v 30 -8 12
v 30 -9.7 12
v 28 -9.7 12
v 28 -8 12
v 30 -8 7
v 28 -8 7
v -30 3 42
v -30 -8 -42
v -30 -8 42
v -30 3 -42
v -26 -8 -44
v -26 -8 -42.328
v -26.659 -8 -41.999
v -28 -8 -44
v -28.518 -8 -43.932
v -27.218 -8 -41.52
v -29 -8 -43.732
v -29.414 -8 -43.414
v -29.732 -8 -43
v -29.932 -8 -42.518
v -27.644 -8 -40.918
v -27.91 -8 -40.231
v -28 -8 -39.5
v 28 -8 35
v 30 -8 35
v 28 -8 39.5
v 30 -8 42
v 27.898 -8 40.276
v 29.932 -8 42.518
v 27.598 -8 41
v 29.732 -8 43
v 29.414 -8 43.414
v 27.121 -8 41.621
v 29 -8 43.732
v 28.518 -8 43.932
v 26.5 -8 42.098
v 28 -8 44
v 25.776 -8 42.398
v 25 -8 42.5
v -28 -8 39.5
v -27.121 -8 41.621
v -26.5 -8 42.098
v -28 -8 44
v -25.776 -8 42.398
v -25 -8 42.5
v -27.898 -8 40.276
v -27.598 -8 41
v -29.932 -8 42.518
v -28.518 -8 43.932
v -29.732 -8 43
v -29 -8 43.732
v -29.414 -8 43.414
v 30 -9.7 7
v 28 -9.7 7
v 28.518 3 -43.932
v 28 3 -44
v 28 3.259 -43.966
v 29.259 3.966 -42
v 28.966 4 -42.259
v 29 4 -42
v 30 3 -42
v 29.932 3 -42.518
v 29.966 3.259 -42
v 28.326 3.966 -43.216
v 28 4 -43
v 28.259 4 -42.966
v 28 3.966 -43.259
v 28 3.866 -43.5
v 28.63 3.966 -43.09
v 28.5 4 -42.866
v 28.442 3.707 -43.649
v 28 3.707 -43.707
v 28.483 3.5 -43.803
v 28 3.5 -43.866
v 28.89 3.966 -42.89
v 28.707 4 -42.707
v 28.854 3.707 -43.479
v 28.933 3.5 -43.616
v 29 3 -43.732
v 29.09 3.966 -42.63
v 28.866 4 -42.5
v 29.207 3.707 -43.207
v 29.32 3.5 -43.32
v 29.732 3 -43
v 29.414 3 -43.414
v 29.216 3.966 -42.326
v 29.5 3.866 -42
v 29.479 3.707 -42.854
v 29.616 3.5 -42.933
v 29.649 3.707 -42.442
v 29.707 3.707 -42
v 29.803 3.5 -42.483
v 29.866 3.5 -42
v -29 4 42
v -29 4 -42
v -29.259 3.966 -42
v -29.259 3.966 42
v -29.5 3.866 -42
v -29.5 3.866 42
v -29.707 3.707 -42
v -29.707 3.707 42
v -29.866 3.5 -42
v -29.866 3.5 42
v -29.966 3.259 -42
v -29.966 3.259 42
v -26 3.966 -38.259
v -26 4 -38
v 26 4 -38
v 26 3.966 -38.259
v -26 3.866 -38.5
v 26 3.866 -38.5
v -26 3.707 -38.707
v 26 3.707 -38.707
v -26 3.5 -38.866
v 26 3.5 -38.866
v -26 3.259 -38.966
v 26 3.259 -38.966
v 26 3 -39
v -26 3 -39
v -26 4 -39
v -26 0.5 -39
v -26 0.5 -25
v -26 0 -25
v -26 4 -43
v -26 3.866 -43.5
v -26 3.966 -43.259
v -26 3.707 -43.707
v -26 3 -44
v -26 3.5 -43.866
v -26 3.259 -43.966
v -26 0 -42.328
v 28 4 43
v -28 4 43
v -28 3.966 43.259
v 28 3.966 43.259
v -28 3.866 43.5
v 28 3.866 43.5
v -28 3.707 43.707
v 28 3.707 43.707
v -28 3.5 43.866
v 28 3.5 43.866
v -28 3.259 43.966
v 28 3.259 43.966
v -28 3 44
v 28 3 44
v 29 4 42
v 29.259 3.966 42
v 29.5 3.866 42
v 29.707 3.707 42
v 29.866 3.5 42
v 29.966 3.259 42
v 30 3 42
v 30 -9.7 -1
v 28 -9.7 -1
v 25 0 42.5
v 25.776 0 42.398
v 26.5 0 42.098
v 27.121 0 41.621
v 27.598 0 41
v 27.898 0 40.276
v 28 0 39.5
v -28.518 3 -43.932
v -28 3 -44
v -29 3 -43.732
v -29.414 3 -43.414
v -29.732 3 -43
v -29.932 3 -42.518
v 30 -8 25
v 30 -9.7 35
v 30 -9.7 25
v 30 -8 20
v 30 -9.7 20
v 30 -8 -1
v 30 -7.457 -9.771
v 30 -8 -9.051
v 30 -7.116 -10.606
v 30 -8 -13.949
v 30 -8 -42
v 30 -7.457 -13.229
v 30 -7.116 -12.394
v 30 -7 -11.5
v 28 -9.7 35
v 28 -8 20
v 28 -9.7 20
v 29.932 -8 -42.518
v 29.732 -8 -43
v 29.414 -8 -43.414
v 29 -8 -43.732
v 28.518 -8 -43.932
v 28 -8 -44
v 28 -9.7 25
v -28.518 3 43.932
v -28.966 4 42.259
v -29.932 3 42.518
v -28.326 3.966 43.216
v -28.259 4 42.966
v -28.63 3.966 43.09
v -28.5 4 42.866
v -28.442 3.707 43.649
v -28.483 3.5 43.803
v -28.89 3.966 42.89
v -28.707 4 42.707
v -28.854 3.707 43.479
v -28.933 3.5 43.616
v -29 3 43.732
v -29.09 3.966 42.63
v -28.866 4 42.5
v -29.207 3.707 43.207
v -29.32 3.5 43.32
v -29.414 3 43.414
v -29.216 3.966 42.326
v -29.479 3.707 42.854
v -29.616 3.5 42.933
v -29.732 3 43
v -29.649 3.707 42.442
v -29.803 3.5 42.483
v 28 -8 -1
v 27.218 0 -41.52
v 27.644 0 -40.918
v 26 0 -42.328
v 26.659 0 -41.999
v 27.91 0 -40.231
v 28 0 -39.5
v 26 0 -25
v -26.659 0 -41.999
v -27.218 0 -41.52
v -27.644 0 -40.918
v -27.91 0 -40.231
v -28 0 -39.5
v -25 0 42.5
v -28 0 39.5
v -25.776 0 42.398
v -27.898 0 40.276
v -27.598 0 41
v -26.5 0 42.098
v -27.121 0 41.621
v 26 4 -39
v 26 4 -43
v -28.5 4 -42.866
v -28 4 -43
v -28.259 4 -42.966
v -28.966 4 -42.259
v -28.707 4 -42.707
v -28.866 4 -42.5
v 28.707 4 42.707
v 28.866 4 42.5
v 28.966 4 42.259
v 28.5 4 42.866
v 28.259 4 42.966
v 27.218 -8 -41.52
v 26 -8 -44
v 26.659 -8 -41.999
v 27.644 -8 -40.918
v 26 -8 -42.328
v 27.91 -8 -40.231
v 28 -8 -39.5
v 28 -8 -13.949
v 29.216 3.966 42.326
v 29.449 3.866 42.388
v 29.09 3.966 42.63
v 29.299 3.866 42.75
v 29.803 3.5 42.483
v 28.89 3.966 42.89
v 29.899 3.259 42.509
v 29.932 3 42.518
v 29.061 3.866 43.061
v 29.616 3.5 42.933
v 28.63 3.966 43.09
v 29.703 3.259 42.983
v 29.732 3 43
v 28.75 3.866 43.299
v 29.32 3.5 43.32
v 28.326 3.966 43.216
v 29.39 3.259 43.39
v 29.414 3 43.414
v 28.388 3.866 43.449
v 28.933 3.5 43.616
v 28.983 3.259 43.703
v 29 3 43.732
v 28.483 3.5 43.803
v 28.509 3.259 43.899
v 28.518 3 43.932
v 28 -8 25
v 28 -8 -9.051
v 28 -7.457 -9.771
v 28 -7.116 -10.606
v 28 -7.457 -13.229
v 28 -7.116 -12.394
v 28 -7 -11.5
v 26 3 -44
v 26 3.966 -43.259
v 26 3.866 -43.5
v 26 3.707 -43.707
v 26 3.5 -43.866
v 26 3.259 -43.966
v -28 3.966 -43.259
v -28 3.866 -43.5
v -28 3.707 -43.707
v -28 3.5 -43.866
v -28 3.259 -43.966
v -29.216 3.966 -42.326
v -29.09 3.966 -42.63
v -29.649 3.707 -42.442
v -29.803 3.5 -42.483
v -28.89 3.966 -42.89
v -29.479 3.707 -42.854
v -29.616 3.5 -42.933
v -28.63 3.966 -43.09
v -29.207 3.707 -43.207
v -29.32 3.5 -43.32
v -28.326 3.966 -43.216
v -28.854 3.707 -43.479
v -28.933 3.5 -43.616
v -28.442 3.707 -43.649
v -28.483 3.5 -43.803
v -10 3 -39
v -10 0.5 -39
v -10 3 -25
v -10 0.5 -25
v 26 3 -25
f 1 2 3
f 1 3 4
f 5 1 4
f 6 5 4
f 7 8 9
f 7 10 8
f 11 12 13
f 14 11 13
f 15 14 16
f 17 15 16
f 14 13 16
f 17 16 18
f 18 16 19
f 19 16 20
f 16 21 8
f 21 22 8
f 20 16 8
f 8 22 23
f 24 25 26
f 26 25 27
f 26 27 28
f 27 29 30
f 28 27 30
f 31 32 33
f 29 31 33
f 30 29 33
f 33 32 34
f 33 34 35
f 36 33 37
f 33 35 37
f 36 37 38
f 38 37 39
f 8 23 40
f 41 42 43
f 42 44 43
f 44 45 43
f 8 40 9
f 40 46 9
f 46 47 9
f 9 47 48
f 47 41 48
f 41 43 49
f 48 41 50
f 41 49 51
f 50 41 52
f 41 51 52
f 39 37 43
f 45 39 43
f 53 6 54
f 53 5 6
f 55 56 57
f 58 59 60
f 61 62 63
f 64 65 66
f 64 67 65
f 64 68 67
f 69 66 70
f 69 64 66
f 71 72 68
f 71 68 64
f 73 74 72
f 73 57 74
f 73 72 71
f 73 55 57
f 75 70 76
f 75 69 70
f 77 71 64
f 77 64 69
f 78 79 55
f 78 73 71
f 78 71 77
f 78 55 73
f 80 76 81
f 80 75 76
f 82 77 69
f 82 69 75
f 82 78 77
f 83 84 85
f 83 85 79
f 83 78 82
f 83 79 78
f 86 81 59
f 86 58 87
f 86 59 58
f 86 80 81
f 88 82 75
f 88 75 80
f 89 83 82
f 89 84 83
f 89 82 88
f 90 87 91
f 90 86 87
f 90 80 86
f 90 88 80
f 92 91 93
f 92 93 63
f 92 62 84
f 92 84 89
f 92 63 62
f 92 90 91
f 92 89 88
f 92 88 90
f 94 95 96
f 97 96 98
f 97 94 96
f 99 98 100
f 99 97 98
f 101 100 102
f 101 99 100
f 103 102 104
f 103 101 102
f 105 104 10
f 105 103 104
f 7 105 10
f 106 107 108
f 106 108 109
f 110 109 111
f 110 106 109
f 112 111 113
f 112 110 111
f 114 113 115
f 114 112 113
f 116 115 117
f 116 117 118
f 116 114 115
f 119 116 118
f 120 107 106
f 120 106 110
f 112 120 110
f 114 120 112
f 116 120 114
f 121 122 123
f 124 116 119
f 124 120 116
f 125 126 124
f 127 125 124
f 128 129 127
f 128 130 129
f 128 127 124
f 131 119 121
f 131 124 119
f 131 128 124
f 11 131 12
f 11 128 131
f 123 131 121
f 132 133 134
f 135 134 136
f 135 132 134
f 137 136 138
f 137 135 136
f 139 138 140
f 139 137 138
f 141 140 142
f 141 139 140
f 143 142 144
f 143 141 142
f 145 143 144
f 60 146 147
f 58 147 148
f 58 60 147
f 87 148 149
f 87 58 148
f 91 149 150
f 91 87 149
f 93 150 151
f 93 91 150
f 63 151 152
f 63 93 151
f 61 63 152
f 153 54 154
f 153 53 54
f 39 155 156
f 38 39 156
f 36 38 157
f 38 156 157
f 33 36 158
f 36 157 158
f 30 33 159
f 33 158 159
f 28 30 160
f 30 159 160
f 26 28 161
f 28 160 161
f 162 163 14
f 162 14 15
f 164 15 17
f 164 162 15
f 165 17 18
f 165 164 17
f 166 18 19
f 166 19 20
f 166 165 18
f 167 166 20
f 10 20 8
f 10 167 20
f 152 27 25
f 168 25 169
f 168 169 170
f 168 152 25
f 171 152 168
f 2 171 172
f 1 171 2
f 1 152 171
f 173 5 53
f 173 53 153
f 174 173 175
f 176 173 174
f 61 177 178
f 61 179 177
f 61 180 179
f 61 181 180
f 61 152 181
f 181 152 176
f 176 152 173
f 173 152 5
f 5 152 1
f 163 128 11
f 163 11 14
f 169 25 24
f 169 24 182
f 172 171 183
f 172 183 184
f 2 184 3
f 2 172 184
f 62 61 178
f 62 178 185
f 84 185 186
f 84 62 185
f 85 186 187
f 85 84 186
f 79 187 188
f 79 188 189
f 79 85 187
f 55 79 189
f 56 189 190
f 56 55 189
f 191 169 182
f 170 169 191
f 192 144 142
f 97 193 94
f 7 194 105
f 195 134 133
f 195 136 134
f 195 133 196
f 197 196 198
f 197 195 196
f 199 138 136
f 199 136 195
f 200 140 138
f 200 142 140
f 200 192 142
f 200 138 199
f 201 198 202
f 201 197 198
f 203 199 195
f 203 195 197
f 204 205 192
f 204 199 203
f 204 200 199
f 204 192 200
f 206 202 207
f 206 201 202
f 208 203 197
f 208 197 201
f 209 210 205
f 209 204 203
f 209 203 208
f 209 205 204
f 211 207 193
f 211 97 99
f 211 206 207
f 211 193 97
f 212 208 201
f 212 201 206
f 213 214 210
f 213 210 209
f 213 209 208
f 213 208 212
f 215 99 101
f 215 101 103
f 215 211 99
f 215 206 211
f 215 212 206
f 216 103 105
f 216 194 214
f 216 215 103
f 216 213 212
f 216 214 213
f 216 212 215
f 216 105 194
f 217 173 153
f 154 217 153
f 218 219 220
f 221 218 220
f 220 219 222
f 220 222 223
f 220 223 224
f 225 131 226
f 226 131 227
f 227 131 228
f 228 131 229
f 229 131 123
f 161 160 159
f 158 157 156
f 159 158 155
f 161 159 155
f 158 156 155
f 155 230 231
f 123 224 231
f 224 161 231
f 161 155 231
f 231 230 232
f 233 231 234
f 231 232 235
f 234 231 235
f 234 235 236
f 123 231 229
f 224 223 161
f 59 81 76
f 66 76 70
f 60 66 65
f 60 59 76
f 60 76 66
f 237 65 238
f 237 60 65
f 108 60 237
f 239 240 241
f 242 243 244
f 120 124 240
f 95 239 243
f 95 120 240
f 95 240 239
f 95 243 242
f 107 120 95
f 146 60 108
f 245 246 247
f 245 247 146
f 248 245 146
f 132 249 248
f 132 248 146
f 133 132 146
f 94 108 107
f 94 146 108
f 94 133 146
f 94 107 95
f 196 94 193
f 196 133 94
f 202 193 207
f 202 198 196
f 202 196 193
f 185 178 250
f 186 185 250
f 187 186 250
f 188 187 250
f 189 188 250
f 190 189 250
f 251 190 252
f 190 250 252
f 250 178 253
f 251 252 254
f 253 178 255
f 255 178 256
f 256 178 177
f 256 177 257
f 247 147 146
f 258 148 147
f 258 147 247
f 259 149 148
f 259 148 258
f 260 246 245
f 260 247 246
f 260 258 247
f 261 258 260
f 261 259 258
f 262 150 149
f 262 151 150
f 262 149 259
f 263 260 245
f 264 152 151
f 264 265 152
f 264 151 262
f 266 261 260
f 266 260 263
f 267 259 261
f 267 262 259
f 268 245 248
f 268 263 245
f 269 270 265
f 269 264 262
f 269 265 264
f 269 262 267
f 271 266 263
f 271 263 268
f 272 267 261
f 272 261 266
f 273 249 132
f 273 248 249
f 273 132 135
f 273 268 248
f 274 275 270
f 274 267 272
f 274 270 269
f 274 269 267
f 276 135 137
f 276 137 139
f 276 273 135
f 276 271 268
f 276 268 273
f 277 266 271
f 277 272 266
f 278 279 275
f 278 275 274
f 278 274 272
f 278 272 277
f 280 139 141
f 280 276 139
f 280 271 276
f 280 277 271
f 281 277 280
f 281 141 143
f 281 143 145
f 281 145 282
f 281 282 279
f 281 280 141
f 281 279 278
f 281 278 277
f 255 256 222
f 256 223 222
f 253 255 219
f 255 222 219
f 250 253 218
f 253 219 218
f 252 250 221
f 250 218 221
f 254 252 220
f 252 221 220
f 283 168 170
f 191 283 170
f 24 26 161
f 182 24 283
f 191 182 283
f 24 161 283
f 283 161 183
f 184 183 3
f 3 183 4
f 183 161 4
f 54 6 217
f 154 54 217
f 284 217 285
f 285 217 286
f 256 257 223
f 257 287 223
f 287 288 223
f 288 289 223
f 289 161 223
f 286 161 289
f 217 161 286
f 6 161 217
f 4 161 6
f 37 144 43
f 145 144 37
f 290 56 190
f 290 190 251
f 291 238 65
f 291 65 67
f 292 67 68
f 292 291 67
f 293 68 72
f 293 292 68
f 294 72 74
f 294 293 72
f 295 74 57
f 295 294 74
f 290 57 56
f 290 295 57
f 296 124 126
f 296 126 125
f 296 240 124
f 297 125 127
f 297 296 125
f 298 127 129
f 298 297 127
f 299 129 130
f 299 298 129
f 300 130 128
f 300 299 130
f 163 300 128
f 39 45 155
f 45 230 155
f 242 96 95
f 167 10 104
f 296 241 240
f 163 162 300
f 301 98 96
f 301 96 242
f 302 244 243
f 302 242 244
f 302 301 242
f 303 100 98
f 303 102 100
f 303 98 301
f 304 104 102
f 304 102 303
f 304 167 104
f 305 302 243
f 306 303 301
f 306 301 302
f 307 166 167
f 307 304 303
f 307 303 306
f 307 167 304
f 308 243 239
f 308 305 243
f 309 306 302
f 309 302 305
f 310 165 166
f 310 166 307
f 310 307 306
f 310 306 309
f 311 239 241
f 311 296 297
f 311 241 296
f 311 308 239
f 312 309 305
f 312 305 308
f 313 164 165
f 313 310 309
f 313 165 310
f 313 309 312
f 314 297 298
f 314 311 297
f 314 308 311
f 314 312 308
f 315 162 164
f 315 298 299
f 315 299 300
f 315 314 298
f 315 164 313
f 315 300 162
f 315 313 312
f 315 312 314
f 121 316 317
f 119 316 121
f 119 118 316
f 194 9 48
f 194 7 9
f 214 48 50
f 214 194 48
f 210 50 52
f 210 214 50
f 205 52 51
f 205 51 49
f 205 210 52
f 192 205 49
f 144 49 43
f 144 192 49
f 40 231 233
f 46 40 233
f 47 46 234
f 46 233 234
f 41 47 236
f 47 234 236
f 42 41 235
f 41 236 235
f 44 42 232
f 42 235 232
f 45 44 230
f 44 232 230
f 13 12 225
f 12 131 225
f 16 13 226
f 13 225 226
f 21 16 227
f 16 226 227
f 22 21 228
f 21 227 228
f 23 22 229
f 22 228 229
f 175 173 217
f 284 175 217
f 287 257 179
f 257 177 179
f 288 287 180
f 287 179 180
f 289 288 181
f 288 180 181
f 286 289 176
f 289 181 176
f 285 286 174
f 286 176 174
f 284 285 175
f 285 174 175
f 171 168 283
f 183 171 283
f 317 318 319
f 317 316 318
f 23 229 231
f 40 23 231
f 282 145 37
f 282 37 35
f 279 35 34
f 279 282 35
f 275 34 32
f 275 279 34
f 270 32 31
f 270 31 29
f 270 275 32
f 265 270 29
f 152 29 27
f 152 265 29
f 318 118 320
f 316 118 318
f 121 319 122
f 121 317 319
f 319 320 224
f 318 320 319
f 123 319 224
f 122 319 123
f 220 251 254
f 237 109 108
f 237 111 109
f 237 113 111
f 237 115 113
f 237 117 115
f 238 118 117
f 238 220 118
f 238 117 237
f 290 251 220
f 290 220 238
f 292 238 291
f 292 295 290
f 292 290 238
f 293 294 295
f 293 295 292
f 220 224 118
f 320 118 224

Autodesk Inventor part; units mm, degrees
ref_plane "YZ Plane" through (0, 0, 0) normal (1, 0, 0) x (0, 1, 0)
ref_plane "XZ Plane" through (0, 0, 0) normal (0, 1, 0) x (-1, 0, 0)
ref_plane "XY Plane" through (0, 0, 0) normal (0, 0, 1) x (1, 0, 0)
sketch "Sketch1" plane through (0, 0, 0) normal (0, 1, 0) x (-1, 0, 0)
  line L0 (28, 44) -> (-28, 44)
  line L1 (-30, 42) -> (-30, -42)
  line L2 (-28, -44) -> (28, -44)
  line L3 (30, -42) -> (30, 42)
  line L4 (30, 44) -> (-30, -44) construction
  line L5 (-30, 44) -> (30, -44) construction
  line L6 (25, 42.5) -> (-25, 42.5)
  line L7 (-28, 39.5) -> (-28, -39.5)
  line L8 (-25, -42.5) -> (25, -42.5)
  line L9 (28, -39.5) -> (28, 39.5)
  line L10 (28, 42.5) -> (-28, -42.5) construction
  line L11 (-28, 42.5) -> (28, -42.5) construction
  arc A0 (25, -42.5) -> (28, -39.5) centre (25, -39.5) ccw
  arc A1 (-28, -39.5) -> (-25, -42.5) centre (-25, -39.5) ccw
  arc A2 (-25, 42.5) -> (-28, 39.5) centre (-25, 39.5) ccw
  arc A3 (28, 39.5) -> (25, 42.5) centre (25, 39.5) ccw
  arc A4 (-30, -42) -> (-28, -44) centre (-28, -42) ccw
  arc A5 (-28, 44) -> (-30, 42) centre (-28, 42) ccw
  arc A6 (28, -44) -> (30, -42) centre (28, -42) ccw
  arc A7 (30, 42) -> (28, 44) centre (28, 42) ccw
  point P0 (0, 0)
  dimension "d2" = 60
  dimension "d3" = 88
  dimension "d4" = 56
  dimension "d5" = 85
  dimension "d6" = 3
  dimension "d7" = 2
extrude "Extrusion1" add sketch "Sketch1" along normal blind 4 contours A7 L3 A6 L2 A4 L1 A5 L0 | A3 L9 A0 L8 A1 L7 A2 L6
extrude "Extrusion2" add sketch "Sketch1" against normal blind 8
sketch "Sketch2" plane through (28, 4, -44) normal (0, 0, -1) x (-1, 0, 0)
  line L0 (53, -12) -> (3, -12) projected
  line L1 (2, -1) -> (54, -1)
  line L2 (54, -1) -> (54, -12)
  line L3 (54, -12) -> (2, -12)
  line L4 (2, -12) -> (2, -1)
  line L5 (-2, -12) -> (-2, 0) projected
  line L6 (58, 0) -> (58, -12) projected
  point P0 (28, -4)
  dimension "d12" = 4
  dimension "d13" = 4
  dimension "d14" = 11
extrude "Extrusion3" cut sketch "Sketch2" against normal blind 19
sketch "Sketch3" plane through (28, 4, -44) normal (0, 0, -1) x (-1, 0, 0)
  line L0 (2, -1) -> (54, -1) projected
  line L1 (54, -1) -> (38, -1)
  line L2 (38, -1) -> (38, -3.5)
  line L3 (38, -3.5) -> (54, -3.5)
  line L4 (54, -3.5) -> (54, -1)
  line L5 (0, 0) -> (56, 0) projected
  line L6 (2, -1) -> (54, -1)
  line L7 (54, -1) -> (54, 0)
  line L8 (54, 0) -> (2, 0)
  line L9 (2, 0) -> (2, -1)
  point P0 (28, -4)
  point P1 (38, -1)
  dimension "d17" = 16
  dimension "d18" = 2.5
extrude "Extrusion4" add sketch "Sketch3" against normal blind 21 contours L0 L4 L3 L2
extrude "Extrusion5" cut sketch "Sketch3" against normal blind 5
sketch "Sketch4" plane through (30, 4, 42) normal (1, 0, 0) x (0, 0, -1)
  line L0 (86, -12) -> (86, 0) projected
  line L1 (84, -12) -> (0, -12) projected
  circle A0 centre (53.5, -14.5) radius 3.5
  point P0 (42, -4)
  point P1 (51.0505, -12)
  point P2 (55.9495, -12)
  dimension "d27" = 2.5
  dimension "d28" = 32.5
  dimension "d29" = 7
extrude "Extrusion6" cut sketch "Sketch4" against normal blind 10 contours L1 A0 picked at (52.8865, -11.841)
sketch "Sketch5" plane through (30, 4, 42) normal (1, 0, 0) x (0, 0, -1)
  line L0 (-4.9094, -13.7) -> (89.7531, -13.7)
  line L1 (84, -12) -> (55.9495, -12) projected
  point P0 (42, -4)
  dimension "d32" = 1.7
sketch "Sketch6" plane through (30, 4, 42) normal (1, 0, 0) x (0, 0, -1)
  line L0 (43, -10.0638) -> (43, -13.7)
  arc A0 (55.9495, -12) -> (51.0505, -12) centre (53.5, -14.5) ccw projected
  line L1 (35, -10.0638) -> (35, -13.7)
  line L2 (30, -13.7) -> (30, -10.0638)
  line L3 (22, -10.0638) -> (22, -13.7)
  line L4 (17, -10.0638) -> (17, -13.7)
  line L5 (7, -10.0638) -> (7, -13.7)
  line L6 (6.4702, -10.0638) -> (43, -10.0638)
  line L7 (-3.7275, -13.7) -> (104.8817, -13.7)
  line L8 (84, -12) -> (55.9495, -12) projected
  point P0 (42, -4)
  dimension "d33" = 10.5
  dimension "d34" = 8
  dimension "d35" = 5
  dimension "d36" = 8
  dimension "d37" = 5
  dimension "d38" = 10
  dimension "d39" = 1.7
extrude "Extrusion7" add sketch "Sketch6" against normal blind 2 contours L0 L7 L1 L6 | L2 L7 L3 L6 | L4 L7 L5 L6
fillet "Fillet1" radius 1 10 edges at (29.4142, 4, -43.4142) (27, 4, -44) (29.4142, 4, 43.4142) (0, 4, 44) (-29.4142, 4, 43.4142) (-30, 4, 0) (-29.4142, 4, -43.4142) (-27, 4, -44) (30, 4, 0) (0, 4, -39)
properties part number "Pi 4 Case  - Upper Panel"
